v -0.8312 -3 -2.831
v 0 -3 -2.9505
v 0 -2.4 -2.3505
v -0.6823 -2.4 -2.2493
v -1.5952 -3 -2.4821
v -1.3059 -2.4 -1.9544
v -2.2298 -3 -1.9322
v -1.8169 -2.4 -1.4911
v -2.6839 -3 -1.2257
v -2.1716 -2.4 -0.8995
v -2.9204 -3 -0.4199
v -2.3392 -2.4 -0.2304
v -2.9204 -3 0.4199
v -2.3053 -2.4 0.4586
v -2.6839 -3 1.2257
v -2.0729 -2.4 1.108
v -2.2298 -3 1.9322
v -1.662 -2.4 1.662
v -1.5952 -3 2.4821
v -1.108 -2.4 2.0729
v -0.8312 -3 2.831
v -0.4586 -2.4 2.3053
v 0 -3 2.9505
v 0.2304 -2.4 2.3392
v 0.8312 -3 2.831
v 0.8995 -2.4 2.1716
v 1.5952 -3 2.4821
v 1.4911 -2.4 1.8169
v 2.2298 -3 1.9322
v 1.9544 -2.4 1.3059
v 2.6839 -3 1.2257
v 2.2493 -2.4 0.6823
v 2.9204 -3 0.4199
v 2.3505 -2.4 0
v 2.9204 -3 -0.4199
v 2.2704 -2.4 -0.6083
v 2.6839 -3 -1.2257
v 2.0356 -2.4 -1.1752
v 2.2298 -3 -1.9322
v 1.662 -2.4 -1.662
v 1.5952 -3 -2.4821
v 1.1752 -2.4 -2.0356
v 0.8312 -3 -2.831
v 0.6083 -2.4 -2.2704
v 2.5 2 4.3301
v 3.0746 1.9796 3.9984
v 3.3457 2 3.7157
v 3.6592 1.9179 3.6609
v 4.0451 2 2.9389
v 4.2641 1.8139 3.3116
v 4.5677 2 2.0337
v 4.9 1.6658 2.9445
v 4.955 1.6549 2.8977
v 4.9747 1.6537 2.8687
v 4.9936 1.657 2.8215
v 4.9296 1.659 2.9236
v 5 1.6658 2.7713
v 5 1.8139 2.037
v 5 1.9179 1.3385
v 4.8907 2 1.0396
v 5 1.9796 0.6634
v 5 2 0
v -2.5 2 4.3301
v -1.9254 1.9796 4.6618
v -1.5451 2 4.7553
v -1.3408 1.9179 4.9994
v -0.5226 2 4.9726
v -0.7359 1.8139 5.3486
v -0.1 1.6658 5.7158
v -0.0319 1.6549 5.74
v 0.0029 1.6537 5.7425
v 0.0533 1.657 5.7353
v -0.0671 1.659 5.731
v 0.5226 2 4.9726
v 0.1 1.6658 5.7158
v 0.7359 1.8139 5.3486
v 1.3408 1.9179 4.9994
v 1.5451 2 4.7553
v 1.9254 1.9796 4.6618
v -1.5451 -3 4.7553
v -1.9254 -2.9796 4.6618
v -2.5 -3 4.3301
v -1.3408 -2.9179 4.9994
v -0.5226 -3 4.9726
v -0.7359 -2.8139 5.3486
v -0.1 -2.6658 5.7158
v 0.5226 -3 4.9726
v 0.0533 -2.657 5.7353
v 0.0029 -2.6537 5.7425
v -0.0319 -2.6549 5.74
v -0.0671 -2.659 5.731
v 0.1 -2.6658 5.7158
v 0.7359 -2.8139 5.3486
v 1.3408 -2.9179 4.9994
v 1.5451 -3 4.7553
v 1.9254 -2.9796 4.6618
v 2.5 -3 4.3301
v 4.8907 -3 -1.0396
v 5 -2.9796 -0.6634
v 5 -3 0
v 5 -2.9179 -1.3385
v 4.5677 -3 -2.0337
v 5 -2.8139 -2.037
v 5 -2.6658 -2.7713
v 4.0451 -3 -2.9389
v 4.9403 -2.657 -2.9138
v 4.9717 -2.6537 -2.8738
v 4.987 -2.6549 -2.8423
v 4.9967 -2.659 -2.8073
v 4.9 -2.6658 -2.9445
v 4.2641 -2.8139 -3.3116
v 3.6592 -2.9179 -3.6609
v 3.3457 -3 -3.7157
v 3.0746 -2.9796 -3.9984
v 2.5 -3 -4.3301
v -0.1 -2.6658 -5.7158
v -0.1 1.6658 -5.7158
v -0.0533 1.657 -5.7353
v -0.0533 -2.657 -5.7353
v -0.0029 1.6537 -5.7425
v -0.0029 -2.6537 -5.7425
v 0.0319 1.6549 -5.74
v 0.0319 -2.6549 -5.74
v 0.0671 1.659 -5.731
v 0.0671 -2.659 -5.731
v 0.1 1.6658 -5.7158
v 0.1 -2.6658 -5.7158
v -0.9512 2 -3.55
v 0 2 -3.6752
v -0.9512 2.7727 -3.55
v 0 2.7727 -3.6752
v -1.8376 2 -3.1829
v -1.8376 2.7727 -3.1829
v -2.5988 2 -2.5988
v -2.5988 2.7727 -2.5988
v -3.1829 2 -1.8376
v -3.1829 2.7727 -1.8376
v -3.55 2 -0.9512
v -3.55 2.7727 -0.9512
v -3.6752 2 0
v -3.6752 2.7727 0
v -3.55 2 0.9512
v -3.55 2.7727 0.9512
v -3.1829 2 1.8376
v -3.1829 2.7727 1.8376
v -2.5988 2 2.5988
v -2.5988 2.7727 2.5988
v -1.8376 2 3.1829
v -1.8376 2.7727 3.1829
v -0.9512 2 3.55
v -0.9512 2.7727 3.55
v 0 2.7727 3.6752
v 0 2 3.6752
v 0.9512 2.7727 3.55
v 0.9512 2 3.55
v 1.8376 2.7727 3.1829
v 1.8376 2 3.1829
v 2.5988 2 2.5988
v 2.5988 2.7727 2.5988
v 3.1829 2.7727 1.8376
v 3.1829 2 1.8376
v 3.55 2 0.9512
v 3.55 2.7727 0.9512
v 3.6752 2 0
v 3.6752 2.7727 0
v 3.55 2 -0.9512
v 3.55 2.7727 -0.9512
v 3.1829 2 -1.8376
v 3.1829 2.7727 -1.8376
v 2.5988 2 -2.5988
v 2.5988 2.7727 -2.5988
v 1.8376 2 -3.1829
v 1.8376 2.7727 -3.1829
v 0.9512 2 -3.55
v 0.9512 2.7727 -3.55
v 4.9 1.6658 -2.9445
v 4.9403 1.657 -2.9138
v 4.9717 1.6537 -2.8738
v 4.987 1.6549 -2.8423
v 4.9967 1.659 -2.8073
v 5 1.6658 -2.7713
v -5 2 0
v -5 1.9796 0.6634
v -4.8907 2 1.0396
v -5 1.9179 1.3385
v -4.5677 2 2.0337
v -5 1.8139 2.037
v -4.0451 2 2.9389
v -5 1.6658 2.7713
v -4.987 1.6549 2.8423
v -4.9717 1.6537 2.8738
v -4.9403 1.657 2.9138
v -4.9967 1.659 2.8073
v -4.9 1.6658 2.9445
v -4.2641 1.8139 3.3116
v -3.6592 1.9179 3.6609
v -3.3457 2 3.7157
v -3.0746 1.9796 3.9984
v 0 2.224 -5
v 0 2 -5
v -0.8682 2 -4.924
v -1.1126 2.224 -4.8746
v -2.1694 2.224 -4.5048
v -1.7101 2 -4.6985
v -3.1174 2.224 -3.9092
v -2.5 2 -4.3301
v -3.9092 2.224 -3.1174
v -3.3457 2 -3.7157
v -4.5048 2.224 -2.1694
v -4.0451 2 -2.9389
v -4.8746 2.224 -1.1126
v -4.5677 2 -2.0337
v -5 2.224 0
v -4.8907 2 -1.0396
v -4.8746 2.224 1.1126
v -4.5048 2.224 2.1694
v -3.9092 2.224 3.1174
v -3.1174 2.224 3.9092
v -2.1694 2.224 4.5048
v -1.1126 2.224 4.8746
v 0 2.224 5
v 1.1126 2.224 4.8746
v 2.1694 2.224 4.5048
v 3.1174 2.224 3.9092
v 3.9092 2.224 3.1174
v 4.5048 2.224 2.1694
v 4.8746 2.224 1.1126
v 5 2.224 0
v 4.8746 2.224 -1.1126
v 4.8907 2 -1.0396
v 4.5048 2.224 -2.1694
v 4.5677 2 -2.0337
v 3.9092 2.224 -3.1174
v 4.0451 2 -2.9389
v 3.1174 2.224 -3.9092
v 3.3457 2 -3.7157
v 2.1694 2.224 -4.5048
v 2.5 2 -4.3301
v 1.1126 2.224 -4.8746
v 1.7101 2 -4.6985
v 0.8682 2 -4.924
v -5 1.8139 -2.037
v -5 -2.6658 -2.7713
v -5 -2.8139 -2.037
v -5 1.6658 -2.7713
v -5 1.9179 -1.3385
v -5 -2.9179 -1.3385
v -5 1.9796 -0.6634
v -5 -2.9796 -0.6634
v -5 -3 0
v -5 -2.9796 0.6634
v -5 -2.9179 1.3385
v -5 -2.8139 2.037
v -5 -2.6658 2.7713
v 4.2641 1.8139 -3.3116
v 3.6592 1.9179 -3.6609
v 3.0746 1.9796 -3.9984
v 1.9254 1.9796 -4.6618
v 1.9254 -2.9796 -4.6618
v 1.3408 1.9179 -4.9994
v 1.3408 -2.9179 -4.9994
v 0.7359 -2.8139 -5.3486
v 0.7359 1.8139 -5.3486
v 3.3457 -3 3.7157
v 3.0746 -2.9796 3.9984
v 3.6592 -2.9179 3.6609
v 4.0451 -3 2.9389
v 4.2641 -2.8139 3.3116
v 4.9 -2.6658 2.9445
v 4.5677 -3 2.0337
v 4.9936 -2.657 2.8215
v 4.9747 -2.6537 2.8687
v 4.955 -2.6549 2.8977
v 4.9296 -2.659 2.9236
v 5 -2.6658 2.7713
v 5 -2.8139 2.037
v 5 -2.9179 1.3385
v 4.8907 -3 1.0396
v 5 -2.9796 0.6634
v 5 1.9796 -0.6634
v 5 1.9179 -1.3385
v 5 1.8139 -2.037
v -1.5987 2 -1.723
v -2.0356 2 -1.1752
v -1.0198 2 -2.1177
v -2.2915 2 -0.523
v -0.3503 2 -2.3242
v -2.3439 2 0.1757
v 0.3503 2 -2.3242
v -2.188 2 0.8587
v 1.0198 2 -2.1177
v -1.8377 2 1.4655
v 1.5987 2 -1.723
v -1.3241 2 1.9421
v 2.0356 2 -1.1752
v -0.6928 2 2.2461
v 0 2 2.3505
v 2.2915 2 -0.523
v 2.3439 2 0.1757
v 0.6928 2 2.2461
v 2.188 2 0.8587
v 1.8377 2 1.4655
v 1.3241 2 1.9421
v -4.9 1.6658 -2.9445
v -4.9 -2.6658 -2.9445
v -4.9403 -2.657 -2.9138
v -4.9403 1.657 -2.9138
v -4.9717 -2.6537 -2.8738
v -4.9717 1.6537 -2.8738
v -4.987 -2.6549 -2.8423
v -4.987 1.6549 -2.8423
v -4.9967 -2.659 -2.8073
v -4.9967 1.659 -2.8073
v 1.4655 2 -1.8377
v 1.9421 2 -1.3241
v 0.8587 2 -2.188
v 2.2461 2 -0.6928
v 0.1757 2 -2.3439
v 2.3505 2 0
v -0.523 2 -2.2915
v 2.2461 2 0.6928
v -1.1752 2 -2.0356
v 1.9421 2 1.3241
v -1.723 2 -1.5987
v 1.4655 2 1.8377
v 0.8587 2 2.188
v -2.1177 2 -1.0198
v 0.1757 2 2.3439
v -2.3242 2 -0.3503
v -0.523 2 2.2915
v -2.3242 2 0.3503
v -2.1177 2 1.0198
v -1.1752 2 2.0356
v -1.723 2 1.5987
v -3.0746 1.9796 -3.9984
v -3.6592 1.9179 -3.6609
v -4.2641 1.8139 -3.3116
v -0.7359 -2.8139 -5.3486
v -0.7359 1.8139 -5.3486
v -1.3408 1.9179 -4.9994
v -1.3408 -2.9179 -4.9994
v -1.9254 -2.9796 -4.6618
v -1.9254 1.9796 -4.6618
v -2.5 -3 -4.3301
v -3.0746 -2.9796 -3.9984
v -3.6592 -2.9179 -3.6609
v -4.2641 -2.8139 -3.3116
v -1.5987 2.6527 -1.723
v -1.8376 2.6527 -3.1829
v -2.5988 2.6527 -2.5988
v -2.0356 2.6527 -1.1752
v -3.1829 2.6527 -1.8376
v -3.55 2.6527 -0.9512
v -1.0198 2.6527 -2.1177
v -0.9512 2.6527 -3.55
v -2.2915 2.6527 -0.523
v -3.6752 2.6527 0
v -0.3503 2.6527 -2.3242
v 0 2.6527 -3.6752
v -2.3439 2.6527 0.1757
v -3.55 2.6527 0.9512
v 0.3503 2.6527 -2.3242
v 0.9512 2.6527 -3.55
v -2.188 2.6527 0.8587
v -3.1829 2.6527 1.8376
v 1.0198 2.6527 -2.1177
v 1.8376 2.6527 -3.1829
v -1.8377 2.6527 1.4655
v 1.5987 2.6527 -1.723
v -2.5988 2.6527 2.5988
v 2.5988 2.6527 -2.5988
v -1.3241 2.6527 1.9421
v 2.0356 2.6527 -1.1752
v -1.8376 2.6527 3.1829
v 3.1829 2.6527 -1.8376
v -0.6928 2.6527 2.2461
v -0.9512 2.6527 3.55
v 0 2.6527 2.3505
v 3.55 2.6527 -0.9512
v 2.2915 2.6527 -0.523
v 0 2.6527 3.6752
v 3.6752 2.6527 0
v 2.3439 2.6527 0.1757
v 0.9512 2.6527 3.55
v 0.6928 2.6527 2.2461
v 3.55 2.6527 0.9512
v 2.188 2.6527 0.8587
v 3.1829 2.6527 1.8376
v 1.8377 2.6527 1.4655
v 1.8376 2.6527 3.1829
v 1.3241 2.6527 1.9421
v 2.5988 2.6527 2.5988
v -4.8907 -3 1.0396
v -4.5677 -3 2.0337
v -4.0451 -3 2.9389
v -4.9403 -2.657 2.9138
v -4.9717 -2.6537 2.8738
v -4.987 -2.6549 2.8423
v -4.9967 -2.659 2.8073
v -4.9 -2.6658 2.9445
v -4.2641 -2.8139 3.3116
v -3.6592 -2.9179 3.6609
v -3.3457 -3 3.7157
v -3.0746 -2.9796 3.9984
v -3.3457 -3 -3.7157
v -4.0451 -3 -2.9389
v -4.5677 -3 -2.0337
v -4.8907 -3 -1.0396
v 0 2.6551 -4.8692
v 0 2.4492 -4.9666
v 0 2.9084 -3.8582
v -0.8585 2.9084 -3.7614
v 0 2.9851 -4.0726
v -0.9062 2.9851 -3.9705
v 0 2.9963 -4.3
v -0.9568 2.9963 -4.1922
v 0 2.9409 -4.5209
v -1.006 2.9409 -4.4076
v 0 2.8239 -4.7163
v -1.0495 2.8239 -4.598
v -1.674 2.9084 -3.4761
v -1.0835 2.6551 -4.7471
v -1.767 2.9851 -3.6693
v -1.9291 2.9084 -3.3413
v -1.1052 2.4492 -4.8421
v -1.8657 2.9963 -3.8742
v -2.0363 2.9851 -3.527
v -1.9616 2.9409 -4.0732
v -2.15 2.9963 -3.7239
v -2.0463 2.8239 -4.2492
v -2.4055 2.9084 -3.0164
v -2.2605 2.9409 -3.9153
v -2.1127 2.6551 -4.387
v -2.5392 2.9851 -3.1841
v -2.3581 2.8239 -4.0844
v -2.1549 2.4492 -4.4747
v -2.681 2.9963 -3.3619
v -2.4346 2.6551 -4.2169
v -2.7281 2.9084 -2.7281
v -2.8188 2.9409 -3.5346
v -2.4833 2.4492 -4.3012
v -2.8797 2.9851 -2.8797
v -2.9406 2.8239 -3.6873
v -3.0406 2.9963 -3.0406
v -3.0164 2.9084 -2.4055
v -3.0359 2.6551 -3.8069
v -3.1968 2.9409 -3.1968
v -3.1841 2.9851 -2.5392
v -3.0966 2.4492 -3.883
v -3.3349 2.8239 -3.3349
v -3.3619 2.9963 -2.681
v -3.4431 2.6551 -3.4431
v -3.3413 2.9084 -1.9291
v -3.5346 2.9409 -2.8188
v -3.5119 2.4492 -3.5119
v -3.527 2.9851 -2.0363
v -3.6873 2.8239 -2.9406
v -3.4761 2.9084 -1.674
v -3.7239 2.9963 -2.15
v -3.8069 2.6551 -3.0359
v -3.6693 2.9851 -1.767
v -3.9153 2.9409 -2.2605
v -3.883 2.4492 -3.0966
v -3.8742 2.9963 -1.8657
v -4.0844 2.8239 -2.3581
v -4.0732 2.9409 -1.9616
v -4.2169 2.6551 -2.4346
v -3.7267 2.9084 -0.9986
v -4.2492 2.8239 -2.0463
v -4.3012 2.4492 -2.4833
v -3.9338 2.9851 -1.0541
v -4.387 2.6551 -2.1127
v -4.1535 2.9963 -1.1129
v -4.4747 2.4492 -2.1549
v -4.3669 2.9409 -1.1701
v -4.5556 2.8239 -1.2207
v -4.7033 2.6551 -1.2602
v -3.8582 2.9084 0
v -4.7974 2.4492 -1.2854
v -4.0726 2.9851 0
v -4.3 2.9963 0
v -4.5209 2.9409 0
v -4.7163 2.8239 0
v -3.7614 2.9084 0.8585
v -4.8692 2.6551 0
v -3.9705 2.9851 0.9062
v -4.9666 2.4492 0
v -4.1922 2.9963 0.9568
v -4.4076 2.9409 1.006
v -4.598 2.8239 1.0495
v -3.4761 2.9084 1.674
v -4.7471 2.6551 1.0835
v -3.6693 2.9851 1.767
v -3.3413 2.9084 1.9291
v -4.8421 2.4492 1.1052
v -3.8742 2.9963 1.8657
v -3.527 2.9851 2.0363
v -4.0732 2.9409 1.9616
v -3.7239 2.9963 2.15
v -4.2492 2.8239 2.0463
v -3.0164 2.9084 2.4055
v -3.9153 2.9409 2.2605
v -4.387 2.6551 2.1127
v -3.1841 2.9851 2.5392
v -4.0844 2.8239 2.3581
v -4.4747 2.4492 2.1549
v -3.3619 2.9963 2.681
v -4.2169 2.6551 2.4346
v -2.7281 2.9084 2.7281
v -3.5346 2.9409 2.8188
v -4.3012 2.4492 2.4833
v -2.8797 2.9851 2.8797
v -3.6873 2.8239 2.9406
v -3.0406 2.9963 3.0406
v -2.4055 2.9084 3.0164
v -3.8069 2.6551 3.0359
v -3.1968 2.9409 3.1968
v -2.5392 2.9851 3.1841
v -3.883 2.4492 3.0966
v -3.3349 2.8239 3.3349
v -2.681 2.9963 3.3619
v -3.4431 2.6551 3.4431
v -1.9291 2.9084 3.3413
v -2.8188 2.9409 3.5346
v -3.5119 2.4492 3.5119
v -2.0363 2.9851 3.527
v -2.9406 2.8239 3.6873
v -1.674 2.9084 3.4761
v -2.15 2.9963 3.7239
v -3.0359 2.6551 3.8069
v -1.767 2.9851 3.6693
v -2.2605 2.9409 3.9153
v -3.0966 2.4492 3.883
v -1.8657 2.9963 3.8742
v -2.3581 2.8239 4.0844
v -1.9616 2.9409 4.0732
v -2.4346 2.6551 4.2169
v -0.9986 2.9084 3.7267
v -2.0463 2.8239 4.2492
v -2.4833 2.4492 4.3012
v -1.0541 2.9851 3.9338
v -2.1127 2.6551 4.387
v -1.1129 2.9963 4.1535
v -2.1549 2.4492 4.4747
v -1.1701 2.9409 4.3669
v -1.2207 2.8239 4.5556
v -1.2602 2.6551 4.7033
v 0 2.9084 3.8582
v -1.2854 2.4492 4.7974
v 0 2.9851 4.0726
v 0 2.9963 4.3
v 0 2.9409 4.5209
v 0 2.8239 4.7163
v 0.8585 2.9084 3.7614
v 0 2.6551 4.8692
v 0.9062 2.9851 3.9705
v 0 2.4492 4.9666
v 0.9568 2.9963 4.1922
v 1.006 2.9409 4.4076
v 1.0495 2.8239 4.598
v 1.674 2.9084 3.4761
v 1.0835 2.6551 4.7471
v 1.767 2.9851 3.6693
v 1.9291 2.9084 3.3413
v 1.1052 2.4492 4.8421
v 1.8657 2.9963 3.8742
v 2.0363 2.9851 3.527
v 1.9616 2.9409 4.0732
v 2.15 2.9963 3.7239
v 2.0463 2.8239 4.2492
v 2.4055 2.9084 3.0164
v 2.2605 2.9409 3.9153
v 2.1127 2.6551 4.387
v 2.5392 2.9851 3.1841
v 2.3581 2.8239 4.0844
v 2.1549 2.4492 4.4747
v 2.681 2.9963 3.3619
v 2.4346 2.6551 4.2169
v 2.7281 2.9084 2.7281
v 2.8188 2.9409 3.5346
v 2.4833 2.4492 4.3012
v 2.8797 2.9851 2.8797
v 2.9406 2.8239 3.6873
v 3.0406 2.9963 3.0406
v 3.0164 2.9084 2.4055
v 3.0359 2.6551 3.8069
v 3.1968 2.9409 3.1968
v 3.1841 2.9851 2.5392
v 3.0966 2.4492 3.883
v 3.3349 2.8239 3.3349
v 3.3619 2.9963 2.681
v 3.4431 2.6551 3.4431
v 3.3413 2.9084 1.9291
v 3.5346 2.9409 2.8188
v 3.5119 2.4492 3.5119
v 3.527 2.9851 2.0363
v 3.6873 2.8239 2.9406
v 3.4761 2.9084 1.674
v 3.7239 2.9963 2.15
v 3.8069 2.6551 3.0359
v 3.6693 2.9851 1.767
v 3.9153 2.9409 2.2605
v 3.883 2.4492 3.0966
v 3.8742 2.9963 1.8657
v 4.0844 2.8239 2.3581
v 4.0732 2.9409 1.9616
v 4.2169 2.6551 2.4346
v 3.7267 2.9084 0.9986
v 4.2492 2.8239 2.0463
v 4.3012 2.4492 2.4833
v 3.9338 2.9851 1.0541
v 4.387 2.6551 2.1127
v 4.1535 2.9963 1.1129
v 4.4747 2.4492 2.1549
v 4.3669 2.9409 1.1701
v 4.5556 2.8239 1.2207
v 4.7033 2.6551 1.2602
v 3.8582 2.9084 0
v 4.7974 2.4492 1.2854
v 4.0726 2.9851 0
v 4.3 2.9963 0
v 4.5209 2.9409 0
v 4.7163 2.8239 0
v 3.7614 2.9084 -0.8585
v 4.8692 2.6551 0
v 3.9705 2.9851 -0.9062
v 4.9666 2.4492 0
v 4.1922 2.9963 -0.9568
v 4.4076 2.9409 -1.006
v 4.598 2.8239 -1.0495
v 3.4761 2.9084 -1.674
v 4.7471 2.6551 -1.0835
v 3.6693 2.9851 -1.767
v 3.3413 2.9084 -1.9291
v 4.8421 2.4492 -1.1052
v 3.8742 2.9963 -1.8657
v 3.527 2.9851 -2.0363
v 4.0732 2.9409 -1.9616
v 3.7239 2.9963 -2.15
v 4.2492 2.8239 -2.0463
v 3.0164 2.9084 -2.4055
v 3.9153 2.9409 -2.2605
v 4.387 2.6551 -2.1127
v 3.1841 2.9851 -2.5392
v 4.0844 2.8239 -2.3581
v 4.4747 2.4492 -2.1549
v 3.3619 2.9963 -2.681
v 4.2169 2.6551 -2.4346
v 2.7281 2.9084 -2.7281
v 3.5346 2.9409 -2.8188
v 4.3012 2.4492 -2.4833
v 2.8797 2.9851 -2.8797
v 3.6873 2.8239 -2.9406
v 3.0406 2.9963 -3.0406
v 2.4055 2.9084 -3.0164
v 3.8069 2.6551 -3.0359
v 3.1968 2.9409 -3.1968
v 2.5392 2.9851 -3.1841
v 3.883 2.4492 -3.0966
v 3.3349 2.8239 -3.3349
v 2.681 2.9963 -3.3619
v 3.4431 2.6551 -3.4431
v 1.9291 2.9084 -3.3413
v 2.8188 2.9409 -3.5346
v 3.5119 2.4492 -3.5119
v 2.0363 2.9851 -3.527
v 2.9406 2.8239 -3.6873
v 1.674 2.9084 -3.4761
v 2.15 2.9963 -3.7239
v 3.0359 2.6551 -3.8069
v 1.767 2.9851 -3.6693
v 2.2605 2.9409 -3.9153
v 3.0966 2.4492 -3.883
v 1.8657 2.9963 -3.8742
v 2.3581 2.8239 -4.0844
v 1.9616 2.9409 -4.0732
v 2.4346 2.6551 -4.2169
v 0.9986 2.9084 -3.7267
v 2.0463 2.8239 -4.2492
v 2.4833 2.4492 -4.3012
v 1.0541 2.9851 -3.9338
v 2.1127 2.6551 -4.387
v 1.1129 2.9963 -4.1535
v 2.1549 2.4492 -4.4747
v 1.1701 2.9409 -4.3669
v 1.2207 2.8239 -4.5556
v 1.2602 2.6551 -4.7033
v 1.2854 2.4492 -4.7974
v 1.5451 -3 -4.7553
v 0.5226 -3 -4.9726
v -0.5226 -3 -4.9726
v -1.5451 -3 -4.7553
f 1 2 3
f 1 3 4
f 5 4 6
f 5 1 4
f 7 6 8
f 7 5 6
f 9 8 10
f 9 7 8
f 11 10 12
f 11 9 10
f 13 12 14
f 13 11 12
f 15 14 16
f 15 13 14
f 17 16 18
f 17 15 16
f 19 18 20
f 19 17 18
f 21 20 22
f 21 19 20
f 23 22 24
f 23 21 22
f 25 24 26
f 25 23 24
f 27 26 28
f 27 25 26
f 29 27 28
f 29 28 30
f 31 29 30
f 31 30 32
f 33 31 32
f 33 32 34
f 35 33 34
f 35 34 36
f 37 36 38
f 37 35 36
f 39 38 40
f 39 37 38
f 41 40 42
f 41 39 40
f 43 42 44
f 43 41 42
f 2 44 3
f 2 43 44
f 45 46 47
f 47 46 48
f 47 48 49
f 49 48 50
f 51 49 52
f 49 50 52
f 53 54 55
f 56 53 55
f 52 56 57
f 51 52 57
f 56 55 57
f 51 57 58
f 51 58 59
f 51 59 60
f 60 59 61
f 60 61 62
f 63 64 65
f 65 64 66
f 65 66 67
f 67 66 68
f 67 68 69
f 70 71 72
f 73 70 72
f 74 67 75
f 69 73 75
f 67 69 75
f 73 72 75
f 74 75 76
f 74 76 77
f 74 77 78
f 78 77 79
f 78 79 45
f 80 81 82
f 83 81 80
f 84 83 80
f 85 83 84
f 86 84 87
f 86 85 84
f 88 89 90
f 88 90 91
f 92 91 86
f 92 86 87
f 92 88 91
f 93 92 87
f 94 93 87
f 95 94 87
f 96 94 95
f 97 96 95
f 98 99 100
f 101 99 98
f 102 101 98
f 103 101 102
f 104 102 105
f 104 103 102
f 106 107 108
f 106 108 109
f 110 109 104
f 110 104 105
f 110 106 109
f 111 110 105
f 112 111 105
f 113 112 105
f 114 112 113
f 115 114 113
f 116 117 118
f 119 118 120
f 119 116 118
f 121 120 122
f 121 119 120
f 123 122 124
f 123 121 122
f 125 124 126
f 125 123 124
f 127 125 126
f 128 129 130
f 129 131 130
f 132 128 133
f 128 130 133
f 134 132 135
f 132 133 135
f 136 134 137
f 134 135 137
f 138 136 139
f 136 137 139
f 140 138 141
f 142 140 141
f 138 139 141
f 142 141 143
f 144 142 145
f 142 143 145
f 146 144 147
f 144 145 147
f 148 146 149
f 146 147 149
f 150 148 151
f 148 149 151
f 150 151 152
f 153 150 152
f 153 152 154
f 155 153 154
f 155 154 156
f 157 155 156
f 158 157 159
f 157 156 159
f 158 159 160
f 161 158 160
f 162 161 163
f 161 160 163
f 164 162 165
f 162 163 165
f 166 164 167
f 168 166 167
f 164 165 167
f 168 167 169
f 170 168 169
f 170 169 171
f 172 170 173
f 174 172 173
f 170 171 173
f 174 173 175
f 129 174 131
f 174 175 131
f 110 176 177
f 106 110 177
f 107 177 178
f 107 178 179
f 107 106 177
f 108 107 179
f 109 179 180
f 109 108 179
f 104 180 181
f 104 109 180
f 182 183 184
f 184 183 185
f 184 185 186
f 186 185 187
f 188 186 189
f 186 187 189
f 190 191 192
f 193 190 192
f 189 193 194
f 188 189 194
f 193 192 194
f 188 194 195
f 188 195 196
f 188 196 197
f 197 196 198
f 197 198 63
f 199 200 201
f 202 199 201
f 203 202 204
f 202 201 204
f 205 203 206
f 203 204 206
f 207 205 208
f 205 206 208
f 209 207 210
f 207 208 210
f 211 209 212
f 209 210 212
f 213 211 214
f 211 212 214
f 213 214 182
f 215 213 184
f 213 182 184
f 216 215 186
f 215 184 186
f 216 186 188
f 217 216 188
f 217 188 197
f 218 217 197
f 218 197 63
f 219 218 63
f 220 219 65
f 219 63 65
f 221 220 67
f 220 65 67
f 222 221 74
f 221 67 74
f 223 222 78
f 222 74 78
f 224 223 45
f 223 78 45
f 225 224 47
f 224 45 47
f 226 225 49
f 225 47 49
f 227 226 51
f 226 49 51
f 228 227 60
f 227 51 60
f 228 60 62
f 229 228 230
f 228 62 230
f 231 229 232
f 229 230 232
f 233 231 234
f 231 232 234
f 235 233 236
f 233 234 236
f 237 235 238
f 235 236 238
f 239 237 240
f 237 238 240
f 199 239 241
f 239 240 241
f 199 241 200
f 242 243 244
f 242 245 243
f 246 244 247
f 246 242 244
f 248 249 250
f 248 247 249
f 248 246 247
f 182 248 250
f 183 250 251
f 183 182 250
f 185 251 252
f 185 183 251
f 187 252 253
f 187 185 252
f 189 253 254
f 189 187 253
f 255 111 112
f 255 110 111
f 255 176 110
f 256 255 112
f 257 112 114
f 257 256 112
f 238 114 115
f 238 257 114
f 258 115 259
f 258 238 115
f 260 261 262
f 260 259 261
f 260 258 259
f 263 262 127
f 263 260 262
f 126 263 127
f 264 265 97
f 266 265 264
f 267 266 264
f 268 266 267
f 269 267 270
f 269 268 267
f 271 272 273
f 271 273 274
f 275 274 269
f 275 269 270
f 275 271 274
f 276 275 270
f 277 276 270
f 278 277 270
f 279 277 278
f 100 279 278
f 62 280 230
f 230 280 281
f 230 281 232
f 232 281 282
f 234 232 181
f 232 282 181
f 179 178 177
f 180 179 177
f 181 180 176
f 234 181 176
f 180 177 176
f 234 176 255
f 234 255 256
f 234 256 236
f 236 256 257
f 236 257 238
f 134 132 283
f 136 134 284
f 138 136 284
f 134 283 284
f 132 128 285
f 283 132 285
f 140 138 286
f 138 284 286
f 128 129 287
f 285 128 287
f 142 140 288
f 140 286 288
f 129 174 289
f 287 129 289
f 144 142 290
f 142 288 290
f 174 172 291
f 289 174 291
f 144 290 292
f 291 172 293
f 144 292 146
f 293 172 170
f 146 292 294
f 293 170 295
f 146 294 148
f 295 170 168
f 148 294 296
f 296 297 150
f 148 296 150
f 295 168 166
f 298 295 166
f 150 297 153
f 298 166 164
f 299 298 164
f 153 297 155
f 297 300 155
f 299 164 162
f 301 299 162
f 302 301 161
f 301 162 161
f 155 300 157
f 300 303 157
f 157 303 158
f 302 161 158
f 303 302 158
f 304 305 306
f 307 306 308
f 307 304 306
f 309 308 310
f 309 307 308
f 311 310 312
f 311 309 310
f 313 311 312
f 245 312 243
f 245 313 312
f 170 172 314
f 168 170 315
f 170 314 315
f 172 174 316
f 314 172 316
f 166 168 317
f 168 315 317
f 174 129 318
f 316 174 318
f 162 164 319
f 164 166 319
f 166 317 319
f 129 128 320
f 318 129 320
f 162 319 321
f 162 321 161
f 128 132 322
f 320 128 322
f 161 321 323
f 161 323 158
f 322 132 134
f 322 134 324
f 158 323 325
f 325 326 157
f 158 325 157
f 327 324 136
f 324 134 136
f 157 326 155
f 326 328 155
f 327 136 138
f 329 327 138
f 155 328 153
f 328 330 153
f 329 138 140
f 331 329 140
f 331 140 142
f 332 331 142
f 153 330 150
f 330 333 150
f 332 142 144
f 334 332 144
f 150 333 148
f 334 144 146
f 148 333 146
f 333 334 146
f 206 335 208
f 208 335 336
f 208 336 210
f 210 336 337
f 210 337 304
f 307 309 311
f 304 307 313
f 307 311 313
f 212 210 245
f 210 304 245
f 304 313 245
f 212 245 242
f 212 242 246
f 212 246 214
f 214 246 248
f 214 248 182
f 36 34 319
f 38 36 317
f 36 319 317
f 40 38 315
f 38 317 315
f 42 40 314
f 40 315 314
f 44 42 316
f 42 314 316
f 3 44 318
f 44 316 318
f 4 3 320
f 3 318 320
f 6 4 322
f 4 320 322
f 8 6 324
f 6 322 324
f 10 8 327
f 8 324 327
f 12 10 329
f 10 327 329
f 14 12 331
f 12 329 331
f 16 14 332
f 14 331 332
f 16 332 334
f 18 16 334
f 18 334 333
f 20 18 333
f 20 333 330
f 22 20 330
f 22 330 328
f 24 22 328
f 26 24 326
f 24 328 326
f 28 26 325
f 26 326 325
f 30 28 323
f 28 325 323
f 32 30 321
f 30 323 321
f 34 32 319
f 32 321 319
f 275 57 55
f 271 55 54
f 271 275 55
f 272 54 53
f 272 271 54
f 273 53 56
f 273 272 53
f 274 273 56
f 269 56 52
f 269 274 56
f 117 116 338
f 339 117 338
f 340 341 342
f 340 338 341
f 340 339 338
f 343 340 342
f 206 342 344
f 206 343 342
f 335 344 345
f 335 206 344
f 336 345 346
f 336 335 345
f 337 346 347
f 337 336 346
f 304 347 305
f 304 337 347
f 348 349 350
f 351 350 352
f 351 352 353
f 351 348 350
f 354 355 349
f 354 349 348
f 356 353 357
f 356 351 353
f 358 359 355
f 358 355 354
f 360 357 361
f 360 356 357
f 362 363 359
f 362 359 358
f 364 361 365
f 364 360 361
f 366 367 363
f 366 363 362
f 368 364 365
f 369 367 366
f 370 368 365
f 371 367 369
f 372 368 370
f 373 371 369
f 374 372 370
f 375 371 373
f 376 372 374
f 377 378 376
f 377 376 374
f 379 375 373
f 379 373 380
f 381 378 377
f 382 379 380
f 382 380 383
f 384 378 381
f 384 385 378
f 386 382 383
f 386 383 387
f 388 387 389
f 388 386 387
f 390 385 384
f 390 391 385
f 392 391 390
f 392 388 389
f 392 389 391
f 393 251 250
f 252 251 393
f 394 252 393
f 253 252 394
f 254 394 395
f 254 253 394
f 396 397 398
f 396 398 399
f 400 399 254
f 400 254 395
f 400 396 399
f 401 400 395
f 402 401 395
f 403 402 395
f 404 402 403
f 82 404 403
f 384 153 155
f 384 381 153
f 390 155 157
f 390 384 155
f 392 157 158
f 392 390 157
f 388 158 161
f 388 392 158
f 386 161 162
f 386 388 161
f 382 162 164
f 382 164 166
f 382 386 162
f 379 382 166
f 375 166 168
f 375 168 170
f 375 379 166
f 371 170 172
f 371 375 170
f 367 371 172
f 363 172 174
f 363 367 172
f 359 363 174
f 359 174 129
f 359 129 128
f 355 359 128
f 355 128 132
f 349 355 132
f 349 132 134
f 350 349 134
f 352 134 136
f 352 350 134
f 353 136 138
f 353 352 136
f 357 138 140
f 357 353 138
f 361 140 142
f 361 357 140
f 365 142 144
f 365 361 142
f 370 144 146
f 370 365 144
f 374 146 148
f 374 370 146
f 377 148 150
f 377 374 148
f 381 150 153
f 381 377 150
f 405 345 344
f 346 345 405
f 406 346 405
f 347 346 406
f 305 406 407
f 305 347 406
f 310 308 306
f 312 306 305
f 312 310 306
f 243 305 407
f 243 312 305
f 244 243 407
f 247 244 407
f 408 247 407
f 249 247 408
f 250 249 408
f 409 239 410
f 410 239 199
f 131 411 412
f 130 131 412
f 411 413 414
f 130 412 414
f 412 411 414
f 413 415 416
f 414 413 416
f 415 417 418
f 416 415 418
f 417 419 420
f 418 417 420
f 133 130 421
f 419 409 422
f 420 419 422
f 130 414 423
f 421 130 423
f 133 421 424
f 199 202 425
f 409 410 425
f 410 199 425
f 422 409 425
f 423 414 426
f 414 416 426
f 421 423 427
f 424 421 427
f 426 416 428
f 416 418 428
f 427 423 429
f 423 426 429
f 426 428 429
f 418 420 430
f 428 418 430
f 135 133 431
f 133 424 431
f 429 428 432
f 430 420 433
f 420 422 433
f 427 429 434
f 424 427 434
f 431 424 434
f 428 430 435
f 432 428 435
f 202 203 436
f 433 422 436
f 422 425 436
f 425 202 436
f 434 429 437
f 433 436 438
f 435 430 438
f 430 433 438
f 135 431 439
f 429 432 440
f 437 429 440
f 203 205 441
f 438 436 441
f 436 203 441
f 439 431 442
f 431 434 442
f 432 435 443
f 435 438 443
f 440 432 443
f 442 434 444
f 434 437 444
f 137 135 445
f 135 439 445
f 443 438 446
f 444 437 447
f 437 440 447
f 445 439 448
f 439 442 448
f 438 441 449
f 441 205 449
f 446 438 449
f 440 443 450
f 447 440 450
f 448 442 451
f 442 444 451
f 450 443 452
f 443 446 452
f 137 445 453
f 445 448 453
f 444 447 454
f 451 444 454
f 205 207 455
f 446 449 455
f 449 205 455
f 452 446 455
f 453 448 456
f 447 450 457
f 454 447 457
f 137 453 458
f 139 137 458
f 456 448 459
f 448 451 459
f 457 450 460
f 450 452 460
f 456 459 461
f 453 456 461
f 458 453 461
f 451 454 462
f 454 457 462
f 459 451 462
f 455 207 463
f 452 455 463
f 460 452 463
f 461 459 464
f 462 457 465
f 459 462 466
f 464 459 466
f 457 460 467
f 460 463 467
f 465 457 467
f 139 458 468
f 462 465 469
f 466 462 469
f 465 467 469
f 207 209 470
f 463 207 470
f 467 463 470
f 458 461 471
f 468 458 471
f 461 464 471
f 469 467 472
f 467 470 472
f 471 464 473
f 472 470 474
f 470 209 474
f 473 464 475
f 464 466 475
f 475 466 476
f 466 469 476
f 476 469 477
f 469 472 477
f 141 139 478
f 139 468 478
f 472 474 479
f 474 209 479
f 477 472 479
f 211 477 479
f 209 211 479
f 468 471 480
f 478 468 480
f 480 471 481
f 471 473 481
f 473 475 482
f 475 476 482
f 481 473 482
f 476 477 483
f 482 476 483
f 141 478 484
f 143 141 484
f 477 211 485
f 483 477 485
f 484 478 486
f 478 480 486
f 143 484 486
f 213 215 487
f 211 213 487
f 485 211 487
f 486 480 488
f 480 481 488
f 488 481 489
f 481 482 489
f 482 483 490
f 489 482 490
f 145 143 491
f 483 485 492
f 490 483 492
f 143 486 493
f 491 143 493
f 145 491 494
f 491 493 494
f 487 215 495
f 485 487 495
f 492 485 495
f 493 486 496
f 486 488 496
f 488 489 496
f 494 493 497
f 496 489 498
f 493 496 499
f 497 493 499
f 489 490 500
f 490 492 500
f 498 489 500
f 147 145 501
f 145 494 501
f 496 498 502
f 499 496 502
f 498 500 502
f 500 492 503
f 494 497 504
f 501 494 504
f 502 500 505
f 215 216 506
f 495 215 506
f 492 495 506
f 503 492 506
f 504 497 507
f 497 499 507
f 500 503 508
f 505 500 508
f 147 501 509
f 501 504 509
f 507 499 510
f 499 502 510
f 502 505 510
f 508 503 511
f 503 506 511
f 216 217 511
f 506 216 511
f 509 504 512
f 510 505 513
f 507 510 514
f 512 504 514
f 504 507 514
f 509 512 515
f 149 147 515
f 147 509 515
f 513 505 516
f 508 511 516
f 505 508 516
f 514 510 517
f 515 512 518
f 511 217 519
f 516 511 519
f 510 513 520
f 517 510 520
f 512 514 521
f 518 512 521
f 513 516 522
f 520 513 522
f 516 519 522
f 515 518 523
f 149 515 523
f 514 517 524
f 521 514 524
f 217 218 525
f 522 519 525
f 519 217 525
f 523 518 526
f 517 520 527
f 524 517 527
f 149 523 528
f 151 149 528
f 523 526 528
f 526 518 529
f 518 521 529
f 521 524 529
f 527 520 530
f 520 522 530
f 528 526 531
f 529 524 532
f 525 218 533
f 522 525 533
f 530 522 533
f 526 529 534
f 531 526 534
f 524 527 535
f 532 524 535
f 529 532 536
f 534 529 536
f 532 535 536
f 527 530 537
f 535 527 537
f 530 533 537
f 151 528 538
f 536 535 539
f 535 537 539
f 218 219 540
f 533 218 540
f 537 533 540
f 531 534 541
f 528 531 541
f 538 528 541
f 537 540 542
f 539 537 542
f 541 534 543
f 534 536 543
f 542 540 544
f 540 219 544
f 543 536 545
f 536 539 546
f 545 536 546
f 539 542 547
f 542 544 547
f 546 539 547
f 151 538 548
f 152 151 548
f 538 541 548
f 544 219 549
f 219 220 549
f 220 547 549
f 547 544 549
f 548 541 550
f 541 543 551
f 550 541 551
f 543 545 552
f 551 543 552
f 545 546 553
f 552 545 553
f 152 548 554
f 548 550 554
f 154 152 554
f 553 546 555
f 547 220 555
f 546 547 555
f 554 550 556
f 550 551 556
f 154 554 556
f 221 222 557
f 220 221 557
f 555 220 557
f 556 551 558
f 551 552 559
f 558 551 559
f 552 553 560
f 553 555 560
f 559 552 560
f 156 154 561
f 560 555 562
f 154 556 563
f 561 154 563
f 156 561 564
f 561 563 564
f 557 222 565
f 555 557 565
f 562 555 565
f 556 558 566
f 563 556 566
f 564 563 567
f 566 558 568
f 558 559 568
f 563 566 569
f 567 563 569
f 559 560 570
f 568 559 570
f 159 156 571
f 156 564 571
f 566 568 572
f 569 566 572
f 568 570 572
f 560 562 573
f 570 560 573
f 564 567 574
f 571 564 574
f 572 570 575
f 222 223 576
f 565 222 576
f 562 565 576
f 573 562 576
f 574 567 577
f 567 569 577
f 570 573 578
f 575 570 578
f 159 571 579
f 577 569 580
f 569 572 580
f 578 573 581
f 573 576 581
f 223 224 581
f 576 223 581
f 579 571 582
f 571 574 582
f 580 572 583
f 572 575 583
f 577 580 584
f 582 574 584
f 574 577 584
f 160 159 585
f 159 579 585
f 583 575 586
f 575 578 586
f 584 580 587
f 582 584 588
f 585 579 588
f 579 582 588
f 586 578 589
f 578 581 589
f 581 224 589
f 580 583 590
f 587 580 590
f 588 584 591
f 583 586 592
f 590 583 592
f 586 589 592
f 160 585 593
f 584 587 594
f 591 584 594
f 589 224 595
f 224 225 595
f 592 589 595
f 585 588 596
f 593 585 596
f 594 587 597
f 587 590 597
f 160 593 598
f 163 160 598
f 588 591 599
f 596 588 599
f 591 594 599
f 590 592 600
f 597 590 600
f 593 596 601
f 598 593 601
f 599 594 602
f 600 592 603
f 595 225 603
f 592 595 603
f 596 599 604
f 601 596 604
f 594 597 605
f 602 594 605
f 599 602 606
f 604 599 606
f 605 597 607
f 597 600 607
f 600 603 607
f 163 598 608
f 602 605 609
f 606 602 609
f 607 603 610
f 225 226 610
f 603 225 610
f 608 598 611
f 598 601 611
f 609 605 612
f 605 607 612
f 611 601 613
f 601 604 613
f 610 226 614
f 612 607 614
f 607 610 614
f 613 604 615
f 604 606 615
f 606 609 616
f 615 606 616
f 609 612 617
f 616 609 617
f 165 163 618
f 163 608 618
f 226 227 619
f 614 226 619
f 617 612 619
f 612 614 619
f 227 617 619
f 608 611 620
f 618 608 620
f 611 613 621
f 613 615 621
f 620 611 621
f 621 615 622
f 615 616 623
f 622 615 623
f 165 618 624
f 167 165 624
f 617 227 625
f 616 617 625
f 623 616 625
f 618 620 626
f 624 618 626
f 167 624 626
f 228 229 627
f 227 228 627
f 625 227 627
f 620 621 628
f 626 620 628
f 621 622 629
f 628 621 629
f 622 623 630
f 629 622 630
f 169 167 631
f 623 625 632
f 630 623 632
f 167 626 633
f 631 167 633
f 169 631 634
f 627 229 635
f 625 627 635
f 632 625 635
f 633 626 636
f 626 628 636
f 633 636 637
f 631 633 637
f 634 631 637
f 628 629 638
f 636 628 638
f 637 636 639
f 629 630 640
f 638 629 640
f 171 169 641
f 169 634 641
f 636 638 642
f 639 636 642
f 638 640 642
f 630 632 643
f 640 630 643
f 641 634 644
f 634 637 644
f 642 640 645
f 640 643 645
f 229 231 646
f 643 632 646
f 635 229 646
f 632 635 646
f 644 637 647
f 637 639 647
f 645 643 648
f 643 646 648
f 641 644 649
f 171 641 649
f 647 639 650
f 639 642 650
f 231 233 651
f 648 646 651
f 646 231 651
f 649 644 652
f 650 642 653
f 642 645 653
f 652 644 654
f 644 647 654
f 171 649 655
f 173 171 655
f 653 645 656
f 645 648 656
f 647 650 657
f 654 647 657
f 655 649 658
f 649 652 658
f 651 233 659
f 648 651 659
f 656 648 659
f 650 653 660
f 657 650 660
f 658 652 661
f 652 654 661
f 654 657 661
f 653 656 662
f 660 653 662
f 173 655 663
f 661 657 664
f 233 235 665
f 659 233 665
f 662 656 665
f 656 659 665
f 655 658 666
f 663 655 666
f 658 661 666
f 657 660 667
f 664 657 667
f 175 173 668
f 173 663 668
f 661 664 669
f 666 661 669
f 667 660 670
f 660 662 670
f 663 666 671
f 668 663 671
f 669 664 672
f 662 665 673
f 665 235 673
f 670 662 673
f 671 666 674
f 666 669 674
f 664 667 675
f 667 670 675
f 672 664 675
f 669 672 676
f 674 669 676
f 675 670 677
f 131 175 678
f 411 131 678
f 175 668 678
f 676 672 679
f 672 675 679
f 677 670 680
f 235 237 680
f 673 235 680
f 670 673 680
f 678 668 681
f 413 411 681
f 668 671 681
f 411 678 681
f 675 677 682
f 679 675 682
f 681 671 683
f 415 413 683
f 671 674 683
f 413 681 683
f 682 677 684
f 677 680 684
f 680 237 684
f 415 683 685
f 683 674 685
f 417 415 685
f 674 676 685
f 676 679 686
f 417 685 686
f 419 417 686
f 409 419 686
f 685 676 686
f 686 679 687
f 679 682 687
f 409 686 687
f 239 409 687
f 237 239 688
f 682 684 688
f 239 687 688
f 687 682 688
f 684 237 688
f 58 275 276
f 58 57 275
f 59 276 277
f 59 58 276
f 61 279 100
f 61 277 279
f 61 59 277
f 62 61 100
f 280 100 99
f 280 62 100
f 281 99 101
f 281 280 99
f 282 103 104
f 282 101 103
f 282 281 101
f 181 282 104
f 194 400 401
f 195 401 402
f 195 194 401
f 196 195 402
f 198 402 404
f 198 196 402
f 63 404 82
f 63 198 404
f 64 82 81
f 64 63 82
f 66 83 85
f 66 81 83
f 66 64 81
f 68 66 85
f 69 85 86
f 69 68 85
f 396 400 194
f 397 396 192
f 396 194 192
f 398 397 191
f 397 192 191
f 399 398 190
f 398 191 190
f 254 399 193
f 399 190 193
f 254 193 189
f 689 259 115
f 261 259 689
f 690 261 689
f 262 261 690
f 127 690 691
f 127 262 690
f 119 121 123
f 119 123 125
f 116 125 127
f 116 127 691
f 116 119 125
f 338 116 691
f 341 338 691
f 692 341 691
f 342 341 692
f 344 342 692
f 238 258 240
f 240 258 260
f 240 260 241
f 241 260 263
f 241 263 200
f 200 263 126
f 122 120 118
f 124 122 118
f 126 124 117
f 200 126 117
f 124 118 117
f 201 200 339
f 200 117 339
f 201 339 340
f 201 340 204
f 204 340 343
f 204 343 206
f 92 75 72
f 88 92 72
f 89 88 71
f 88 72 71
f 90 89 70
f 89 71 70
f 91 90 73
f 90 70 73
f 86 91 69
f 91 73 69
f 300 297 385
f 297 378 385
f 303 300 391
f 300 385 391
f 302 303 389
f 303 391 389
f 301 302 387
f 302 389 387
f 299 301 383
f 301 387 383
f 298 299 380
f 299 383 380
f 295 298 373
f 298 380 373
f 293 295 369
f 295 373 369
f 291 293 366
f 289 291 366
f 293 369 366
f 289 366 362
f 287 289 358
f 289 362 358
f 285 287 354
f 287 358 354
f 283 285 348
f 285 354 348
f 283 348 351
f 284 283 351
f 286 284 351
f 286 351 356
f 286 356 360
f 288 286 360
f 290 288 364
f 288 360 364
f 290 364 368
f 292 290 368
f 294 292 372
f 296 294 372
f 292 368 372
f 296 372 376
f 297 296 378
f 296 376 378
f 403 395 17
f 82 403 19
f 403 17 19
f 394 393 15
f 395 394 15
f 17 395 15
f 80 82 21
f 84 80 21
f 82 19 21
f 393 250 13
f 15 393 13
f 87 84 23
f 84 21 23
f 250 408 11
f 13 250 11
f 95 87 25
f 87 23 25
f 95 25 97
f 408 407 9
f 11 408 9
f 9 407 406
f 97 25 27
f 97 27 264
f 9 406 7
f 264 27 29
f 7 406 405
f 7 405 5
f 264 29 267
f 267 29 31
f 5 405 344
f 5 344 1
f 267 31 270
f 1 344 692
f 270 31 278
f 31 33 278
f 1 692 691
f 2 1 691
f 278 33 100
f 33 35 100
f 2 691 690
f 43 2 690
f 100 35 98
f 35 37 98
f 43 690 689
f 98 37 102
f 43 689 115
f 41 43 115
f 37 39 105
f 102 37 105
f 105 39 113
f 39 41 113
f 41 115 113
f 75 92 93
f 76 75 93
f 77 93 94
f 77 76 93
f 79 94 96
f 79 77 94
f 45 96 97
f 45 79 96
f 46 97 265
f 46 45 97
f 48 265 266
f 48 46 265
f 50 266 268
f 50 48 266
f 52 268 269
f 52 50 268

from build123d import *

# Parameters (mm, degrees)
SKETCH2_R                = 2.350480947
BOSS_EXTRUDE1_DEPTH      = 3
BOSS_EXTRUDE1_DEPTH_BACK = 3
FILLET1_R                = 0.2
SKETCH4_W                = 1.324759527
SKETCH4_H                = 0.652707199


with BuildPart() as part:
    # Sketch2 → Boss-Extrude1 (new body, two sides)
    with BuildSketch(Plane(origin=(0, 0, 0), x_dir=(1, 0, 0), z_dir=(0, 1, 0))) as boss_extrude1_sk:
        Polygon((0, 5.773502692), (-5, 2.886751346), (-5, -2.886751346), (0, -5.773502692), (5, -2.886751346), (5, 2.886751346), align=None)
        Circle(SKETCH2_R, mode=Mode.SUBTRACT)
    extrude(amount=BOSS_EXTRUDE1_DEPTH)
    extrude(boss_extrude1_sk.sketch, amount=-BOSS_EXTRUDE1_DEPTH_BACK)

    # Fillet1
    fillet1_edges = [part.edges().sort_by_distance(p)[0] for p in [
        (5, 0, -2.886751346),
        (5, 0, 2.886751346),
        (0, 0, 5.773502692),
        (-5, 0, 2.886751346),
        (-5, 0, -2.886751346),
        (0, 0, -5.773502692),
    ]]
    fillet(fillet1_edges, radius=FILLET1_R)

    # Sketch3 → Cut-Revolve2 (revolve, cut)
    with BuildSketch(Plane(origin=(0, 0, 0), x_dir=(0, 0, -1), z_dir=(1, 0, 0))):
        with BuildLine():
            Line((5.773502692, 2), (5.773502692, 4))
            Line((5.773502692, 4), (2.350480947, 4))
            Line((2.350480947, 4), (2.350480947, 2))
            Line((2.350480947, 2), (3.675240474, 2))
            Line((3.675240474, 2), (3.675240474, 2.772707199))
            ThreePointArc((3.675240474, 2.772707199), (4.520946192, 2.940928526), (5, 2.223973836))
            Line((5, 2.223973836), (5, 2))
            Line((5, 2), (5.773502692, 1.639309771))
            Line((5.773502692, 1.639309771), (5.773502692, 2))
        make_face()
        Polygon((5, -3), (5.773502692, -2.639309771), (5.773502692, -3), align=None)
        Polygon((2.350480947, -3), (2.350480947, -2.4), (2.950480947, -3), align=None)
    revolve(axis=Axis((0, -3, 0), (0, 1, 0)), mode=Mode.SUBTRACT)


with BuildPart() as body_2:
    # Sketch4 → Revolve1 (revolve)
    with BuildSketch(Plane(origin=(0, 0, 0), x_dir=(0, 0, -1), z_dir=(1, 0, 0))):
        with Locations((-3.012860711, 2.326353599)):
            Rectangle(SKETCH4_W, SKETCH4_H)
    revolve(axis=Axis((0, -3, 0), (0, 1, 0)))


solid = Compound([part.part, body_2.part])
